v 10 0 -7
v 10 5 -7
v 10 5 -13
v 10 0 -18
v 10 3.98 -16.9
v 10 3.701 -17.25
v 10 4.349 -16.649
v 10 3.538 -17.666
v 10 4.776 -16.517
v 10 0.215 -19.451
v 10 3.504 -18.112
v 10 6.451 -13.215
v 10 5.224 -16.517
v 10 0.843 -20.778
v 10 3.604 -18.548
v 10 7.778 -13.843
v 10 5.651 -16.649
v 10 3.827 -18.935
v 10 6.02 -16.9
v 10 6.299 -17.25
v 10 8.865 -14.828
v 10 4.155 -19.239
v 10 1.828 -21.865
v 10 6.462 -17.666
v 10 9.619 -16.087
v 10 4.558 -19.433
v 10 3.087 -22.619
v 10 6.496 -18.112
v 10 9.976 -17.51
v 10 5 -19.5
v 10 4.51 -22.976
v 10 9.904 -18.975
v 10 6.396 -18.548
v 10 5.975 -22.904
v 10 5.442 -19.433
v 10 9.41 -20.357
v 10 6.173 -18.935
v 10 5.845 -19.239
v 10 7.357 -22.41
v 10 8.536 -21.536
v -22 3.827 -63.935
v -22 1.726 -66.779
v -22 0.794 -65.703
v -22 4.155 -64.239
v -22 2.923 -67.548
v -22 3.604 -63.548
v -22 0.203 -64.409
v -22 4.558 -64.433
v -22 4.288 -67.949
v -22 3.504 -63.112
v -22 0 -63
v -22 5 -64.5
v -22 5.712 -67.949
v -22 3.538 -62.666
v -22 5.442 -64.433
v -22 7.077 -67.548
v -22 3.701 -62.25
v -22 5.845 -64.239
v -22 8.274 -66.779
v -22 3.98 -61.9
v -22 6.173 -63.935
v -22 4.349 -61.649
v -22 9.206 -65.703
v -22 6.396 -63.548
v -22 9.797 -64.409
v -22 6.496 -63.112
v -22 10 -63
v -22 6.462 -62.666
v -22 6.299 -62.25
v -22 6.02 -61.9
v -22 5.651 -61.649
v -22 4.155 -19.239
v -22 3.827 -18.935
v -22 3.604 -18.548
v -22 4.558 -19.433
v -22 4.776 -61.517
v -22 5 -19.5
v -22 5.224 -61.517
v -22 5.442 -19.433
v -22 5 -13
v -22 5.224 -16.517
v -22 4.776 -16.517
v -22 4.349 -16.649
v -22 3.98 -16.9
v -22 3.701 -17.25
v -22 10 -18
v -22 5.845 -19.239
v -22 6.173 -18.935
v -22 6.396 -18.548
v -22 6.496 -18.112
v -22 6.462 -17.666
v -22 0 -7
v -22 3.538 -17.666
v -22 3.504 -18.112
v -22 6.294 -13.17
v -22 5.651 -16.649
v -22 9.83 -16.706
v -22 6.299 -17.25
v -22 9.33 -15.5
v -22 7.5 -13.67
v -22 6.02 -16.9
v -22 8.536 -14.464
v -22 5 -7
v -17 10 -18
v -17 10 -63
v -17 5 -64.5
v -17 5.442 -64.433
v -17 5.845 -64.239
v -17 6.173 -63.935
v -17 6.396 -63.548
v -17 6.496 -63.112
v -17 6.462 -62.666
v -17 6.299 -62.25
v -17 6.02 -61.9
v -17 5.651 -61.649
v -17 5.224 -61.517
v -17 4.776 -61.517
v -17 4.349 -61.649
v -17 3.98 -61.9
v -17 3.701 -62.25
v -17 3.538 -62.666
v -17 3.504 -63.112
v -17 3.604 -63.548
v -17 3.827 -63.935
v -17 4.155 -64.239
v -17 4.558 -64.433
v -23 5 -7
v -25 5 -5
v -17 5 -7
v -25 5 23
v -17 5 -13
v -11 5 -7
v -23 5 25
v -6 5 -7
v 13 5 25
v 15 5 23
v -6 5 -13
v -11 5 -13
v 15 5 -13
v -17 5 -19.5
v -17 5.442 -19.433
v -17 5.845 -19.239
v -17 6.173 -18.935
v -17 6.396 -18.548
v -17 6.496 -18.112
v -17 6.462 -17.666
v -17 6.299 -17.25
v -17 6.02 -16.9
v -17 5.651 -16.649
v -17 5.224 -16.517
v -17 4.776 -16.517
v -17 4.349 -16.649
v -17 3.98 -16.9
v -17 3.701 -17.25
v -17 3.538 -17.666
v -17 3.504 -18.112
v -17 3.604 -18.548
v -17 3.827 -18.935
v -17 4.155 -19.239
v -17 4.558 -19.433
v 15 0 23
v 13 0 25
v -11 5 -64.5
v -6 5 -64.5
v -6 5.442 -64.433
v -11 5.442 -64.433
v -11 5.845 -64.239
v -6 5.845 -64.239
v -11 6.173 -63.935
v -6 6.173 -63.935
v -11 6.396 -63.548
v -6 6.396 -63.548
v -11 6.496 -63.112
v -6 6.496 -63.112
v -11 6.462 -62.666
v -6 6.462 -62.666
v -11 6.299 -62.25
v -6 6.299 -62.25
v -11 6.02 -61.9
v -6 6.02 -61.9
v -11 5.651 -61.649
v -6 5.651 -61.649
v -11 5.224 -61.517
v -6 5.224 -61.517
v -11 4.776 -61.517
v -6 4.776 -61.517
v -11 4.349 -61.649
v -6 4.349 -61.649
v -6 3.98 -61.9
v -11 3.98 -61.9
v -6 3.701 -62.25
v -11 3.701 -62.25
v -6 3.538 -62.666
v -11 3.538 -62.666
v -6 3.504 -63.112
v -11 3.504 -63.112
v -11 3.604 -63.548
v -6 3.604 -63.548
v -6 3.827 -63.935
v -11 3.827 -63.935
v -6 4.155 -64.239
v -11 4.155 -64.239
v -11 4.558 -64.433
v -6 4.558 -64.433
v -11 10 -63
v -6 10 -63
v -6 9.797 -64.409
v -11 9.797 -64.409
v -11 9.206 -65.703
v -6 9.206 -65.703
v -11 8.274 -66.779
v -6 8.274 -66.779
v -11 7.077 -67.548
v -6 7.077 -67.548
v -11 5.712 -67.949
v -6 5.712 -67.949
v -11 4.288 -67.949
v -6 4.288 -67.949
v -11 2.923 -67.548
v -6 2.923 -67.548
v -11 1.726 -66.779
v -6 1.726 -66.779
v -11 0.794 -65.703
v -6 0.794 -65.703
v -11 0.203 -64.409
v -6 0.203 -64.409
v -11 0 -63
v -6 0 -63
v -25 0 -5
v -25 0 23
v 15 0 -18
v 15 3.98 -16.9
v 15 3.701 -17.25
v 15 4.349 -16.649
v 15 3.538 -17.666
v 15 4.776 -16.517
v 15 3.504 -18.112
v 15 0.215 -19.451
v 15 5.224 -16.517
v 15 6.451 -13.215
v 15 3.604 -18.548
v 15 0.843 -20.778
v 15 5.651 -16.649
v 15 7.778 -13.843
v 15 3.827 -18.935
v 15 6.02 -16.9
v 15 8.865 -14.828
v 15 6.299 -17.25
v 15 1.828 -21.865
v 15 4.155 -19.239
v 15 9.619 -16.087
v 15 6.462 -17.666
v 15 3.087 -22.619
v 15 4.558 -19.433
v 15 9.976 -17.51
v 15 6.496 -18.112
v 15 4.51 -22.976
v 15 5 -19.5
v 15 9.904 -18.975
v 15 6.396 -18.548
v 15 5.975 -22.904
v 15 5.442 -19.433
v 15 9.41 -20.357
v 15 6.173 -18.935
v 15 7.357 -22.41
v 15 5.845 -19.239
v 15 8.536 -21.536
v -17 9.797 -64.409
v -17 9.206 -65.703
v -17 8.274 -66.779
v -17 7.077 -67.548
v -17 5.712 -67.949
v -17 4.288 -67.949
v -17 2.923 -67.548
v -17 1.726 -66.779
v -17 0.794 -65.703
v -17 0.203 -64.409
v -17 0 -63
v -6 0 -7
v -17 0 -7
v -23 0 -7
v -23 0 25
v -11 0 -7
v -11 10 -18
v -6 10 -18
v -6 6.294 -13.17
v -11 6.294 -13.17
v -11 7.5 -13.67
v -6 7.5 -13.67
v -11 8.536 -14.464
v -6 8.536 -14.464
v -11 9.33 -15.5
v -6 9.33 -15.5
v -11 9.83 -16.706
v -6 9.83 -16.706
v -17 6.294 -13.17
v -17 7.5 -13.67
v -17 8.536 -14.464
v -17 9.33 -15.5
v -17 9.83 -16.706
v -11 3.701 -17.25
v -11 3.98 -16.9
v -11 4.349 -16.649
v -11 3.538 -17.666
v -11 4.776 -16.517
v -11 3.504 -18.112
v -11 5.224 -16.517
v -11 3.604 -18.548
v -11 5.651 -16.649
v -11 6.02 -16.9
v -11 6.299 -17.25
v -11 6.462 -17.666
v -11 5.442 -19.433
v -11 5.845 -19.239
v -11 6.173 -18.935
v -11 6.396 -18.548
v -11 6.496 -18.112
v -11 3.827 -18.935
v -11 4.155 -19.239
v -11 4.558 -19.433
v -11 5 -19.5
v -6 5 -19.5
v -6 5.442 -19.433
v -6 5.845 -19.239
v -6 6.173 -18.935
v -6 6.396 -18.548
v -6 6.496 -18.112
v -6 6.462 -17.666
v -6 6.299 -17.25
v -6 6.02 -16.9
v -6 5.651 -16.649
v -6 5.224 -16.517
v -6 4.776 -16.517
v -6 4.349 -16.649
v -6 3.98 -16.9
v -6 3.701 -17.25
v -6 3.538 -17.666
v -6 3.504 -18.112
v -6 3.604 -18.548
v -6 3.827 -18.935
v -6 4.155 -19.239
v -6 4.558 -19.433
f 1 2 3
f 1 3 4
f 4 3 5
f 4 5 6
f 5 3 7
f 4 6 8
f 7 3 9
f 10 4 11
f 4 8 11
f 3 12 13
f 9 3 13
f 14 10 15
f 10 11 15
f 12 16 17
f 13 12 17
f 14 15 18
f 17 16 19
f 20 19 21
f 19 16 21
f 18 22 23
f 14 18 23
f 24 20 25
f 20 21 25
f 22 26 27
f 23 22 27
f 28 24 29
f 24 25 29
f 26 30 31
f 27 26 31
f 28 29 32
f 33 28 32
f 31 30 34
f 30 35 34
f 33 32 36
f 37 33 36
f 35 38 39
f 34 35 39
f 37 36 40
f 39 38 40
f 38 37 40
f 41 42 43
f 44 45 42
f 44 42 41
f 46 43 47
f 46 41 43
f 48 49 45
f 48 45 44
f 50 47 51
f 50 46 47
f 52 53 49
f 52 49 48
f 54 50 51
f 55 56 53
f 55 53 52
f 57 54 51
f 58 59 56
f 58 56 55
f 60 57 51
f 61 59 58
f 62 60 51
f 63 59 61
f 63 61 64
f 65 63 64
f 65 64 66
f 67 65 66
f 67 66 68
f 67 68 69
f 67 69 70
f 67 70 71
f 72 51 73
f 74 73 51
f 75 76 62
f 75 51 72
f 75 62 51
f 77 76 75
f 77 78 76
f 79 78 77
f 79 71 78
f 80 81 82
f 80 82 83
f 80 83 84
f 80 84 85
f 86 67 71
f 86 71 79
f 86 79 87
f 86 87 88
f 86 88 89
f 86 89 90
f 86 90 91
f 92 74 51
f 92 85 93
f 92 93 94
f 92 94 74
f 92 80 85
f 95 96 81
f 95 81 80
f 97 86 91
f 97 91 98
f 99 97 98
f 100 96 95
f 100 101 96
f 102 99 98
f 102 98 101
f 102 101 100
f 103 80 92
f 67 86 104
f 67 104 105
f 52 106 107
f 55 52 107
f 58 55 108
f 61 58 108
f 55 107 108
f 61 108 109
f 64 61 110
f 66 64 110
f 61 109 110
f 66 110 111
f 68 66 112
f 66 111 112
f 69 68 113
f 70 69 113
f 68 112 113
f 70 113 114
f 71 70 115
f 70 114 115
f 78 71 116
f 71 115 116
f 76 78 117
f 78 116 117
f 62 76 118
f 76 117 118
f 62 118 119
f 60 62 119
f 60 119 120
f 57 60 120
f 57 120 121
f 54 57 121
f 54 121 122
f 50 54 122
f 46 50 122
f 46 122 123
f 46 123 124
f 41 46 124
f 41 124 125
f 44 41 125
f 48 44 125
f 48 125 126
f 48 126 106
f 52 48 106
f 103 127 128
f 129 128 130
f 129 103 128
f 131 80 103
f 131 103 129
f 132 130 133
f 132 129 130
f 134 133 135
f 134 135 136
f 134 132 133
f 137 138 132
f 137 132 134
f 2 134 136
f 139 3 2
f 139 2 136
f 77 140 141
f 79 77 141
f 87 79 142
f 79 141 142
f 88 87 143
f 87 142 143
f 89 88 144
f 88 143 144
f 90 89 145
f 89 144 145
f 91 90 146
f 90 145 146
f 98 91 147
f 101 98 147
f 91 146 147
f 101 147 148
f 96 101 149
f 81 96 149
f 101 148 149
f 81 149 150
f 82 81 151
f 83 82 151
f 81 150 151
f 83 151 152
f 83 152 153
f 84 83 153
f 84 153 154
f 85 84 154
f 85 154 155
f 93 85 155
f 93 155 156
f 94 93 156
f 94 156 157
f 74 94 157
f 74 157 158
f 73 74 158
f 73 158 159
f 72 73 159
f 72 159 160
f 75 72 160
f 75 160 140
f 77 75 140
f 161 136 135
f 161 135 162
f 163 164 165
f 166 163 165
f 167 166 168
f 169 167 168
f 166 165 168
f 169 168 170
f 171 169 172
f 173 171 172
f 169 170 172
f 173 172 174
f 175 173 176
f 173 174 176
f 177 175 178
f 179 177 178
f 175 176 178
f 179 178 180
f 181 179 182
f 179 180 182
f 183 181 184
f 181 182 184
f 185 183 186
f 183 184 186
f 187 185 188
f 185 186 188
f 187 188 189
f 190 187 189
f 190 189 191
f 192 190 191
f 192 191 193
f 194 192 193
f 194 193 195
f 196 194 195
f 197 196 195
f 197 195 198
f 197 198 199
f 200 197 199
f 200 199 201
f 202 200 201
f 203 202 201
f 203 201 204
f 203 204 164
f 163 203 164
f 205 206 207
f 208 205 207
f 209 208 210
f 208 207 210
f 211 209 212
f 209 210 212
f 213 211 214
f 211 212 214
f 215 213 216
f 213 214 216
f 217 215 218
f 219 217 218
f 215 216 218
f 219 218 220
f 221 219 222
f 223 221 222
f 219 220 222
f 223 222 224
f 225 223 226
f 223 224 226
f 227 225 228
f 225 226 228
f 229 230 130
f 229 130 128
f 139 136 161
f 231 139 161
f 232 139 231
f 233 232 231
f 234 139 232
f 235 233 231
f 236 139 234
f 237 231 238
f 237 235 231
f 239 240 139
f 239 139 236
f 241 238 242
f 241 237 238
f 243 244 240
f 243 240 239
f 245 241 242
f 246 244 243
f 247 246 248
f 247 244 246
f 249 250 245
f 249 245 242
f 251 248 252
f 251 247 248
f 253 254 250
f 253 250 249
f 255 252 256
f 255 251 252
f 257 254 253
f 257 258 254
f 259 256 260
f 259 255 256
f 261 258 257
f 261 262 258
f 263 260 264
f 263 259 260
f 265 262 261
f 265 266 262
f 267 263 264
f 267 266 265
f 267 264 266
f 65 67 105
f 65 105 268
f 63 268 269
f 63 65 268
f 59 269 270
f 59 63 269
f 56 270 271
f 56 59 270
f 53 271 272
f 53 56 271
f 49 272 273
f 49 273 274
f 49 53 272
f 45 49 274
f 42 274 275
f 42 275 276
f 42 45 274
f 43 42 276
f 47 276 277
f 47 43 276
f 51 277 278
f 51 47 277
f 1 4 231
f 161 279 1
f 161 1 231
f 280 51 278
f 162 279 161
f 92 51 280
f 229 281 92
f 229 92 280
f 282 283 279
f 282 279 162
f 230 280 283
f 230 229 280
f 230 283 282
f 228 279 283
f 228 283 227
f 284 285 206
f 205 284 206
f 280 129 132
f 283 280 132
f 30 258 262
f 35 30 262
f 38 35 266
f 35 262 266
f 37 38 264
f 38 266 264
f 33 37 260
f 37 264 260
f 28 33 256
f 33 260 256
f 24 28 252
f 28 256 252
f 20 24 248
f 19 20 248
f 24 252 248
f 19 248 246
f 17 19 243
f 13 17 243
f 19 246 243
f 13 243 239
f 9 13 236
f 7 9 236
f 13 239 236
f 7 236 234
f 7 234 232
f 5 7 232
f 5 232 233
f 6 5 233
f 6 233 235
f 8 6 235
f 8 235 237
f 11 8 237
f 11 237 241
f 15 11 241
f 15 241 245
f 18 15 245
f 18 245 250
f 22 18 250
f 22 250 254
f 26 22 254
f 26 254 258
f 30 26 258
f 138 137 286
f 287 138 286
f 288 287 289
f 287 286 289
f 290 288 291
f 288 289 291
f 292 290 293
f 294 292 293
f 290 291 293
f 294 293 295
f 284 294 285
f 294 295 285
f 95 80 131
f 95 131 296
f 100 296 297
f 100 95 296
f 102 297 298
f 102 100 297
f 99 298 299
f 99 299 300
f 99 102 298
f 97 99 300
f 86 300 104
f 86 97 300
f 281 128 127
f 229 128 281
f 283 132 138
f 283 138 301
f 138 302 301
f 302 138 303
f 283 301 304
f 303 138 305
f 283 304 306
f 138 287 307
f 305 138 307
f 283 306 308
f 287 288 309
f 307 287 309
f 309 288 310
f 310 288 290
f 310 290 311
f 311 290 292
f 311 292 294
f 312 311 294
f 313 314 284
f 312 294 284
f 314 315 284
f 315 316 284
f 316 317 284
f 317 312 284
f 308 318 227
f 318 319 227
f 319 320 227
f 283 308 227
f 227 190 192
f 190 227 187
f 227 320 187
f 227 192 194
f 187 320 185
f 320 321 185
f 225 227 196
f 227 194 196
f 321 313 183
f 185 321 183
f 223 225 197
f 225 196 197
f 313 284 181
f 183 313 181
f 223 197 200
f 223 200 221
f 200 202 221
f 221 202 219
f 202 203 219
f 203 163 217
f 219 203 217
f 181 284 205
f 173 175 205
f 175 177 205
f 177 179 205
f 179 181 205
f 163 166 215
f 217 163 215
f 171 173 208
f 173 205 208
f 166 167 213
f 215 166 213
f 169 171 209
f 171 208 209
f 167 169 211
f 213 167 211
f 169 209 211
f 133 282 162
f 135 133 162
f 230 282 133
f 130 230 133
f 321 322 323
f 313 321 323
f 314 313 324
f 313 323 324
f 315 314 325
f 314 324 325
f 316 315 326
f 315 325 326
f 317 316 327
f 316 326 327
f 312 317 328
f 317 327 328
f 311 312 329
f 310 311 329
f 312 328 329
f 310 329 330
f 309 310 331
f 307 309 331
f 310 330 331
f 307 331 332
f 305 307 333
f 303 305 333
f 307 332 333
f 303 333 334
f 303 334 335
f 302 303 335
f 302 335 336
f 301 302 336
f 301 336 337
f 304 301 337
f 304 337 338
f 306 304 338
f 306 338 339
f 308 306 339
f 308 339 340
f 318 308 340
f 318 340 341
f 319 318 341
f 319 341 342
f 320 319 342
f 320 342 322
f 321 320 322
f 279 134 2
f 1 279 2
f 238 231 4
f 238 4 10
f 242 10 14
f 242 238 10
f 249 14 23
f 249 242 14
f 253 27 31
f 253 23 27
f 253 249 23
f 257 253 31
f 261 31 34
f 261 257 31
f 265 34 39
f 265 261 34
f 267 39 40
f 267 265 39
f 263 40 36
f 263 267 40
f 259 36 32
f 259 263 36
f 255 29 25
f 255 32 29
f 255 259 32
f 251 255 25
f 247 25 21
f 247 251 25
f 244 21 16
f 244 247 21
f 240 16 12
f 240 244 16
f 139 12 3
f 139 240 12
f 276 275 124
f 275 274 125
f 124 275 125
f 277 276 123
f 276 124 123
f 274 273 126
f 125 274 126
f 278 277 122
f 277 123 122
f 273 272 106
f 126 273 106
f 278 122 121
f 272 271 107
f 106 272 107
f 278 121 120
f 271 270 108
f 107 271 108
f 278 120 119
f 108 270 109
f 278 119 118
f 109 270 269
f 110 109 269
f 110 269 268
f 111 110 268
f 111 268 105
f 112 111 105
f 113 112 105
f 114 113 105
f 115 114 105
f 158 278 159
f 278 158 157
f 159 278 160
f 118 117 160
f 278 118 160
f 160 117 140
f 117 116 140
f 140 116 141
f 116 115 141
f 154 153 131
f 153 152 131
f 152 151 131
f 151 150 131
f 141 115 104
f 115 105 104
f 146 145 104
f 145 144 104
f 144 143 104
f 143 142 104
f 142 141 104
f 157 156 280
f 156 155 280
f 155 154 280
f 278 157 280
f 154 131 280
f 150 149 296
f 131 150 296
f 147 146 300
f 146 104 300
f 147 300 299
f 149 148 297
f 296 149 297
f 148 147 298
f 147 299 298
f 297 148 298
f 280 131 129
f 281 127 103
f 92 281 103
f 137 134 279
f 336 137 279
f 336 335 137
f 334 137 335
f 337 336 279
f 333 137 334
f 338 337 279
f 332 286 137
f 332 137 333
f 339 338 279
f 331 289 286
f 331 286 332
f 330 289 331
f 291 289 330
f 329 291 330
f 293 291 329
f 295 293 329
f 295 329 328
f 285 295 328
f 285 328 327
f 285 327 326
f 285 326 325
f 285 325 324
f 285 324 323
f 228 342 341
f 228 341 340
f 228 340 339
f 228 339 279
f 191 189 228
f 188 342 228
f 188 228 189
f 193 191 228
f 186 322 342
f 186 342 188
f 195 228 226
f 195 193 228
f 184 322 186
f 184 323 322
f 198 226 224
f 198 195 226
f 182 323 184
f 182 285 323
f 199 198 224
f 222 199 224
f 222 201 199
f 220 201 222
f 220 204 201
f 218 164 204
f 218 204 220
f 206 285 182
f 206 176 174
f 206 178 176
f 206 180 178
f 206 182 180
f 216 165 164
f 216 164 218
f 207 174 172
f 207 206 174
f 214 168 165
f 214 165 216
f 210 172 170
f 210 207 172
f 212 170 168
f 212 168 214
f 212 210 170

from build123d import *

# Parameters (mm, degrees)
SKETCH_1_W               = 50
SKETCH_1_H               = 43
EXTRUDE_1_DEPTH          = 5
SKETCH_3_R               = 5
EXTRUDE_2_DEPTH          = 5
EXTRUDE_START            = -6
EXTRUDE_3_DEPTH          = 5
EXTRUDE_4_DEPTH          = 5
SKETCH_9_R               = 1.5
CUT_EXTRUDE_2_DEPTH      = 11
CUT_EXTRUDE_2_DEPTH_BACK = 41
SKETCH_11_W              = 3
SKETCH_11_H              = 11
SKETCH_11_W_2            = 6
SKETCH_11_W_3            = 16
SKETCH_11_W_4            = 10
CUT_EXTRUDE_3_DEPTH      = 6
CUT_EXTRUDE_3_DEPTH_BACK = 6
SKETCH_12_R              = 1.5
CUT_EXTRUDE_4_DEPTH      = 32
CUT_EXTRUDE_4_DEPTH_BACK = 20
SKETCH_13_W              = 10
SKETCH_13_H              = 32
CUT_EXTRUDE_5_DEPTH      = 6
CUT_EXTRUDE_5_DEPTH_BACK = 6
CHAMFER_2_SIZE           = 2


with BuildPart() as part:
    # 草图1 → 凸台-拉伸1 (new body)
    with BuildSketch(Plane(origin=(0, 0, 0), x_dir=(1, 0, 0), z_dir=(0, 1, 0))):
        with Locations((0, -3.5)):
            Rectangle(SKETCH_1_W, SKETCH_1_H)
    extrude(amount=EXTRUDE_1_DEPTH)

    # 草图3 → 凸台-拉伸2 (add)
    with BuildSketch(Plane(origin=(15, 0, 0), x_dir=(0, 0, -1), z_dir=(1, 0, 0))):
        with Locations((18, 5)):
            Circle(SKETCH_3_R)
    extrude(amount=-EXTRUDE_2_DEPTH)

    # 草图5 → 凸台-拉伸3 (add)
    with BuildSketch(Plane(origin=(0, 0, 0), x_dir=(0, 0, -1), z_dir=(1, 0, 0)).offset(EXTRUDE_START)):
        with BuildLine():
            Line((18, 10), (63, 10))
            ThreePointArc((63, 10), (68, 5), (63, 0))
            Line((63, 0), (18, 0))
            ThreePointArc((18, 0), (13, 5), (18, 10))
        make_face()
    extrude(amount=-EXTRUDE_3_DEPTH)

    # 草图6 → 凸台-拉伸4 (add)
    with BuildSketch(Plane(origin=(-22, 0, 0), x_dir=(0, 0, -1), z_dir=(1, 0, 0))):
        with BuildLine():
            Line((18, 10), (63, 10))
            ThreePointArc((63, 10), (68, 5), (63, 0))
            Line((63, 0), (18, 0))
            ThreePointArc((18, 0), (13, 5), (18, 10))
        make_face()
    extrude(amount=EXTRUDE_4_DEPTH)

    # 草图9 → 切除-拉伸2 (cut, two sides)
    with BuildSketch(Plane(origin=(15, 0, 0), x_dir=(0, 0, -1), z_dir=(1, 0, 0))) as cut_extrude_2_sk:
        with Locations((18, 5)):
            Circle(SKETCH_9_R)
    extrude(amount=CUT_EXTRUDE_2_DEPTH, mode=Mode.SUBTRACT)
    extrude(cut_extrude_2_sk.sketch, amount=-CUT_EXTRUDE_2_DEPTH_BACK, mode=Mode.SUBTRACT)

    # 草图11 → 切除-拉伸3 (cut, two sides)
    with BuildSketch(Plane(origin=(0, 5, 0), x_dir=(1, 0, 0), z_dir=(0, 1, 0))) as cut_extrude_3_sk:
        with Locations((-23.5, 12.5)):
            Rectangle(SKETCH_11_W, SKETCH_11_H)
        with Locations((-14, 12.5)):
            Rectangle(SKETCH_11_W_2, SKETCH_11_H)
        with Locations((2, 12.5)):
            Rectangle(SKETCH_11_W_3, SKETCH_11_H)
        with Locations((20, 12.5)):
            Rectangle(SKETCH_11_W_4, SKETCH_11_H)
    extrude(amount=CUT_EXTRUDE_3_DEPTH, mode=Mode.SUBTRACT)
    extrude(cut_extrude_3_sk.sketch, amount=-CUT_EXTRUDE_3_DEPTH_BACK, mode=Mode.SUBTRACT)

    # 草图12 → 切除-拉伸4 (cut, two sides)
    with BuildSketch(Plane(origin=(-6, 0, 0), x_dir=(0, 0, -1), z_dir=(1, 0, 0))) as cut_extrude_4_sk:
        with Locations((63, 5)):
            Circle(SKETCH_12_R)
    extrude(amount=CUT_EXTRUDE_4_DEPTH, mode=Mode.SUBTRACT)
    extrude(cut_extrude_4_sk.sketch, amount=-CUT_EXTRUDE_4_DEPTH_BACK, mode=Mode.SUBTRACT)

    # 草图13 → 切除-拉伸5 (cut, two sides)
    with BuildSketch(Plane(origin=(0, 5, 0), x_dir=(1, 0, 0), z_dir=(0, 1, 0))) as cut_extrude_5_sk:
        with Locations((20, -9)):
            Rectangle(SKETCH_13_W, SKETCH_13_H)
    extrude(amount=CUT_EXTRUDE_5_DEPTH, mode=Mode.SUBTRACT)
    extrude(cut_extrude_5_sk.sketch, amount=-CUT_EXTRUDE_5_DEPTH_BACK, mode=Mode.SUBTRACT)

    # 倒角2
    chamfer_2_edges = [part.edges().sort_by_distance(p)[0] for p in [
        (-25, 2.5, -7),
        (15, 2.5, 25),
        (-25, 2.5, 25),
    ]]
    chamfer(chamfer_2_edges, length=CHAMFER_2_SIZE)


solid = part.part
